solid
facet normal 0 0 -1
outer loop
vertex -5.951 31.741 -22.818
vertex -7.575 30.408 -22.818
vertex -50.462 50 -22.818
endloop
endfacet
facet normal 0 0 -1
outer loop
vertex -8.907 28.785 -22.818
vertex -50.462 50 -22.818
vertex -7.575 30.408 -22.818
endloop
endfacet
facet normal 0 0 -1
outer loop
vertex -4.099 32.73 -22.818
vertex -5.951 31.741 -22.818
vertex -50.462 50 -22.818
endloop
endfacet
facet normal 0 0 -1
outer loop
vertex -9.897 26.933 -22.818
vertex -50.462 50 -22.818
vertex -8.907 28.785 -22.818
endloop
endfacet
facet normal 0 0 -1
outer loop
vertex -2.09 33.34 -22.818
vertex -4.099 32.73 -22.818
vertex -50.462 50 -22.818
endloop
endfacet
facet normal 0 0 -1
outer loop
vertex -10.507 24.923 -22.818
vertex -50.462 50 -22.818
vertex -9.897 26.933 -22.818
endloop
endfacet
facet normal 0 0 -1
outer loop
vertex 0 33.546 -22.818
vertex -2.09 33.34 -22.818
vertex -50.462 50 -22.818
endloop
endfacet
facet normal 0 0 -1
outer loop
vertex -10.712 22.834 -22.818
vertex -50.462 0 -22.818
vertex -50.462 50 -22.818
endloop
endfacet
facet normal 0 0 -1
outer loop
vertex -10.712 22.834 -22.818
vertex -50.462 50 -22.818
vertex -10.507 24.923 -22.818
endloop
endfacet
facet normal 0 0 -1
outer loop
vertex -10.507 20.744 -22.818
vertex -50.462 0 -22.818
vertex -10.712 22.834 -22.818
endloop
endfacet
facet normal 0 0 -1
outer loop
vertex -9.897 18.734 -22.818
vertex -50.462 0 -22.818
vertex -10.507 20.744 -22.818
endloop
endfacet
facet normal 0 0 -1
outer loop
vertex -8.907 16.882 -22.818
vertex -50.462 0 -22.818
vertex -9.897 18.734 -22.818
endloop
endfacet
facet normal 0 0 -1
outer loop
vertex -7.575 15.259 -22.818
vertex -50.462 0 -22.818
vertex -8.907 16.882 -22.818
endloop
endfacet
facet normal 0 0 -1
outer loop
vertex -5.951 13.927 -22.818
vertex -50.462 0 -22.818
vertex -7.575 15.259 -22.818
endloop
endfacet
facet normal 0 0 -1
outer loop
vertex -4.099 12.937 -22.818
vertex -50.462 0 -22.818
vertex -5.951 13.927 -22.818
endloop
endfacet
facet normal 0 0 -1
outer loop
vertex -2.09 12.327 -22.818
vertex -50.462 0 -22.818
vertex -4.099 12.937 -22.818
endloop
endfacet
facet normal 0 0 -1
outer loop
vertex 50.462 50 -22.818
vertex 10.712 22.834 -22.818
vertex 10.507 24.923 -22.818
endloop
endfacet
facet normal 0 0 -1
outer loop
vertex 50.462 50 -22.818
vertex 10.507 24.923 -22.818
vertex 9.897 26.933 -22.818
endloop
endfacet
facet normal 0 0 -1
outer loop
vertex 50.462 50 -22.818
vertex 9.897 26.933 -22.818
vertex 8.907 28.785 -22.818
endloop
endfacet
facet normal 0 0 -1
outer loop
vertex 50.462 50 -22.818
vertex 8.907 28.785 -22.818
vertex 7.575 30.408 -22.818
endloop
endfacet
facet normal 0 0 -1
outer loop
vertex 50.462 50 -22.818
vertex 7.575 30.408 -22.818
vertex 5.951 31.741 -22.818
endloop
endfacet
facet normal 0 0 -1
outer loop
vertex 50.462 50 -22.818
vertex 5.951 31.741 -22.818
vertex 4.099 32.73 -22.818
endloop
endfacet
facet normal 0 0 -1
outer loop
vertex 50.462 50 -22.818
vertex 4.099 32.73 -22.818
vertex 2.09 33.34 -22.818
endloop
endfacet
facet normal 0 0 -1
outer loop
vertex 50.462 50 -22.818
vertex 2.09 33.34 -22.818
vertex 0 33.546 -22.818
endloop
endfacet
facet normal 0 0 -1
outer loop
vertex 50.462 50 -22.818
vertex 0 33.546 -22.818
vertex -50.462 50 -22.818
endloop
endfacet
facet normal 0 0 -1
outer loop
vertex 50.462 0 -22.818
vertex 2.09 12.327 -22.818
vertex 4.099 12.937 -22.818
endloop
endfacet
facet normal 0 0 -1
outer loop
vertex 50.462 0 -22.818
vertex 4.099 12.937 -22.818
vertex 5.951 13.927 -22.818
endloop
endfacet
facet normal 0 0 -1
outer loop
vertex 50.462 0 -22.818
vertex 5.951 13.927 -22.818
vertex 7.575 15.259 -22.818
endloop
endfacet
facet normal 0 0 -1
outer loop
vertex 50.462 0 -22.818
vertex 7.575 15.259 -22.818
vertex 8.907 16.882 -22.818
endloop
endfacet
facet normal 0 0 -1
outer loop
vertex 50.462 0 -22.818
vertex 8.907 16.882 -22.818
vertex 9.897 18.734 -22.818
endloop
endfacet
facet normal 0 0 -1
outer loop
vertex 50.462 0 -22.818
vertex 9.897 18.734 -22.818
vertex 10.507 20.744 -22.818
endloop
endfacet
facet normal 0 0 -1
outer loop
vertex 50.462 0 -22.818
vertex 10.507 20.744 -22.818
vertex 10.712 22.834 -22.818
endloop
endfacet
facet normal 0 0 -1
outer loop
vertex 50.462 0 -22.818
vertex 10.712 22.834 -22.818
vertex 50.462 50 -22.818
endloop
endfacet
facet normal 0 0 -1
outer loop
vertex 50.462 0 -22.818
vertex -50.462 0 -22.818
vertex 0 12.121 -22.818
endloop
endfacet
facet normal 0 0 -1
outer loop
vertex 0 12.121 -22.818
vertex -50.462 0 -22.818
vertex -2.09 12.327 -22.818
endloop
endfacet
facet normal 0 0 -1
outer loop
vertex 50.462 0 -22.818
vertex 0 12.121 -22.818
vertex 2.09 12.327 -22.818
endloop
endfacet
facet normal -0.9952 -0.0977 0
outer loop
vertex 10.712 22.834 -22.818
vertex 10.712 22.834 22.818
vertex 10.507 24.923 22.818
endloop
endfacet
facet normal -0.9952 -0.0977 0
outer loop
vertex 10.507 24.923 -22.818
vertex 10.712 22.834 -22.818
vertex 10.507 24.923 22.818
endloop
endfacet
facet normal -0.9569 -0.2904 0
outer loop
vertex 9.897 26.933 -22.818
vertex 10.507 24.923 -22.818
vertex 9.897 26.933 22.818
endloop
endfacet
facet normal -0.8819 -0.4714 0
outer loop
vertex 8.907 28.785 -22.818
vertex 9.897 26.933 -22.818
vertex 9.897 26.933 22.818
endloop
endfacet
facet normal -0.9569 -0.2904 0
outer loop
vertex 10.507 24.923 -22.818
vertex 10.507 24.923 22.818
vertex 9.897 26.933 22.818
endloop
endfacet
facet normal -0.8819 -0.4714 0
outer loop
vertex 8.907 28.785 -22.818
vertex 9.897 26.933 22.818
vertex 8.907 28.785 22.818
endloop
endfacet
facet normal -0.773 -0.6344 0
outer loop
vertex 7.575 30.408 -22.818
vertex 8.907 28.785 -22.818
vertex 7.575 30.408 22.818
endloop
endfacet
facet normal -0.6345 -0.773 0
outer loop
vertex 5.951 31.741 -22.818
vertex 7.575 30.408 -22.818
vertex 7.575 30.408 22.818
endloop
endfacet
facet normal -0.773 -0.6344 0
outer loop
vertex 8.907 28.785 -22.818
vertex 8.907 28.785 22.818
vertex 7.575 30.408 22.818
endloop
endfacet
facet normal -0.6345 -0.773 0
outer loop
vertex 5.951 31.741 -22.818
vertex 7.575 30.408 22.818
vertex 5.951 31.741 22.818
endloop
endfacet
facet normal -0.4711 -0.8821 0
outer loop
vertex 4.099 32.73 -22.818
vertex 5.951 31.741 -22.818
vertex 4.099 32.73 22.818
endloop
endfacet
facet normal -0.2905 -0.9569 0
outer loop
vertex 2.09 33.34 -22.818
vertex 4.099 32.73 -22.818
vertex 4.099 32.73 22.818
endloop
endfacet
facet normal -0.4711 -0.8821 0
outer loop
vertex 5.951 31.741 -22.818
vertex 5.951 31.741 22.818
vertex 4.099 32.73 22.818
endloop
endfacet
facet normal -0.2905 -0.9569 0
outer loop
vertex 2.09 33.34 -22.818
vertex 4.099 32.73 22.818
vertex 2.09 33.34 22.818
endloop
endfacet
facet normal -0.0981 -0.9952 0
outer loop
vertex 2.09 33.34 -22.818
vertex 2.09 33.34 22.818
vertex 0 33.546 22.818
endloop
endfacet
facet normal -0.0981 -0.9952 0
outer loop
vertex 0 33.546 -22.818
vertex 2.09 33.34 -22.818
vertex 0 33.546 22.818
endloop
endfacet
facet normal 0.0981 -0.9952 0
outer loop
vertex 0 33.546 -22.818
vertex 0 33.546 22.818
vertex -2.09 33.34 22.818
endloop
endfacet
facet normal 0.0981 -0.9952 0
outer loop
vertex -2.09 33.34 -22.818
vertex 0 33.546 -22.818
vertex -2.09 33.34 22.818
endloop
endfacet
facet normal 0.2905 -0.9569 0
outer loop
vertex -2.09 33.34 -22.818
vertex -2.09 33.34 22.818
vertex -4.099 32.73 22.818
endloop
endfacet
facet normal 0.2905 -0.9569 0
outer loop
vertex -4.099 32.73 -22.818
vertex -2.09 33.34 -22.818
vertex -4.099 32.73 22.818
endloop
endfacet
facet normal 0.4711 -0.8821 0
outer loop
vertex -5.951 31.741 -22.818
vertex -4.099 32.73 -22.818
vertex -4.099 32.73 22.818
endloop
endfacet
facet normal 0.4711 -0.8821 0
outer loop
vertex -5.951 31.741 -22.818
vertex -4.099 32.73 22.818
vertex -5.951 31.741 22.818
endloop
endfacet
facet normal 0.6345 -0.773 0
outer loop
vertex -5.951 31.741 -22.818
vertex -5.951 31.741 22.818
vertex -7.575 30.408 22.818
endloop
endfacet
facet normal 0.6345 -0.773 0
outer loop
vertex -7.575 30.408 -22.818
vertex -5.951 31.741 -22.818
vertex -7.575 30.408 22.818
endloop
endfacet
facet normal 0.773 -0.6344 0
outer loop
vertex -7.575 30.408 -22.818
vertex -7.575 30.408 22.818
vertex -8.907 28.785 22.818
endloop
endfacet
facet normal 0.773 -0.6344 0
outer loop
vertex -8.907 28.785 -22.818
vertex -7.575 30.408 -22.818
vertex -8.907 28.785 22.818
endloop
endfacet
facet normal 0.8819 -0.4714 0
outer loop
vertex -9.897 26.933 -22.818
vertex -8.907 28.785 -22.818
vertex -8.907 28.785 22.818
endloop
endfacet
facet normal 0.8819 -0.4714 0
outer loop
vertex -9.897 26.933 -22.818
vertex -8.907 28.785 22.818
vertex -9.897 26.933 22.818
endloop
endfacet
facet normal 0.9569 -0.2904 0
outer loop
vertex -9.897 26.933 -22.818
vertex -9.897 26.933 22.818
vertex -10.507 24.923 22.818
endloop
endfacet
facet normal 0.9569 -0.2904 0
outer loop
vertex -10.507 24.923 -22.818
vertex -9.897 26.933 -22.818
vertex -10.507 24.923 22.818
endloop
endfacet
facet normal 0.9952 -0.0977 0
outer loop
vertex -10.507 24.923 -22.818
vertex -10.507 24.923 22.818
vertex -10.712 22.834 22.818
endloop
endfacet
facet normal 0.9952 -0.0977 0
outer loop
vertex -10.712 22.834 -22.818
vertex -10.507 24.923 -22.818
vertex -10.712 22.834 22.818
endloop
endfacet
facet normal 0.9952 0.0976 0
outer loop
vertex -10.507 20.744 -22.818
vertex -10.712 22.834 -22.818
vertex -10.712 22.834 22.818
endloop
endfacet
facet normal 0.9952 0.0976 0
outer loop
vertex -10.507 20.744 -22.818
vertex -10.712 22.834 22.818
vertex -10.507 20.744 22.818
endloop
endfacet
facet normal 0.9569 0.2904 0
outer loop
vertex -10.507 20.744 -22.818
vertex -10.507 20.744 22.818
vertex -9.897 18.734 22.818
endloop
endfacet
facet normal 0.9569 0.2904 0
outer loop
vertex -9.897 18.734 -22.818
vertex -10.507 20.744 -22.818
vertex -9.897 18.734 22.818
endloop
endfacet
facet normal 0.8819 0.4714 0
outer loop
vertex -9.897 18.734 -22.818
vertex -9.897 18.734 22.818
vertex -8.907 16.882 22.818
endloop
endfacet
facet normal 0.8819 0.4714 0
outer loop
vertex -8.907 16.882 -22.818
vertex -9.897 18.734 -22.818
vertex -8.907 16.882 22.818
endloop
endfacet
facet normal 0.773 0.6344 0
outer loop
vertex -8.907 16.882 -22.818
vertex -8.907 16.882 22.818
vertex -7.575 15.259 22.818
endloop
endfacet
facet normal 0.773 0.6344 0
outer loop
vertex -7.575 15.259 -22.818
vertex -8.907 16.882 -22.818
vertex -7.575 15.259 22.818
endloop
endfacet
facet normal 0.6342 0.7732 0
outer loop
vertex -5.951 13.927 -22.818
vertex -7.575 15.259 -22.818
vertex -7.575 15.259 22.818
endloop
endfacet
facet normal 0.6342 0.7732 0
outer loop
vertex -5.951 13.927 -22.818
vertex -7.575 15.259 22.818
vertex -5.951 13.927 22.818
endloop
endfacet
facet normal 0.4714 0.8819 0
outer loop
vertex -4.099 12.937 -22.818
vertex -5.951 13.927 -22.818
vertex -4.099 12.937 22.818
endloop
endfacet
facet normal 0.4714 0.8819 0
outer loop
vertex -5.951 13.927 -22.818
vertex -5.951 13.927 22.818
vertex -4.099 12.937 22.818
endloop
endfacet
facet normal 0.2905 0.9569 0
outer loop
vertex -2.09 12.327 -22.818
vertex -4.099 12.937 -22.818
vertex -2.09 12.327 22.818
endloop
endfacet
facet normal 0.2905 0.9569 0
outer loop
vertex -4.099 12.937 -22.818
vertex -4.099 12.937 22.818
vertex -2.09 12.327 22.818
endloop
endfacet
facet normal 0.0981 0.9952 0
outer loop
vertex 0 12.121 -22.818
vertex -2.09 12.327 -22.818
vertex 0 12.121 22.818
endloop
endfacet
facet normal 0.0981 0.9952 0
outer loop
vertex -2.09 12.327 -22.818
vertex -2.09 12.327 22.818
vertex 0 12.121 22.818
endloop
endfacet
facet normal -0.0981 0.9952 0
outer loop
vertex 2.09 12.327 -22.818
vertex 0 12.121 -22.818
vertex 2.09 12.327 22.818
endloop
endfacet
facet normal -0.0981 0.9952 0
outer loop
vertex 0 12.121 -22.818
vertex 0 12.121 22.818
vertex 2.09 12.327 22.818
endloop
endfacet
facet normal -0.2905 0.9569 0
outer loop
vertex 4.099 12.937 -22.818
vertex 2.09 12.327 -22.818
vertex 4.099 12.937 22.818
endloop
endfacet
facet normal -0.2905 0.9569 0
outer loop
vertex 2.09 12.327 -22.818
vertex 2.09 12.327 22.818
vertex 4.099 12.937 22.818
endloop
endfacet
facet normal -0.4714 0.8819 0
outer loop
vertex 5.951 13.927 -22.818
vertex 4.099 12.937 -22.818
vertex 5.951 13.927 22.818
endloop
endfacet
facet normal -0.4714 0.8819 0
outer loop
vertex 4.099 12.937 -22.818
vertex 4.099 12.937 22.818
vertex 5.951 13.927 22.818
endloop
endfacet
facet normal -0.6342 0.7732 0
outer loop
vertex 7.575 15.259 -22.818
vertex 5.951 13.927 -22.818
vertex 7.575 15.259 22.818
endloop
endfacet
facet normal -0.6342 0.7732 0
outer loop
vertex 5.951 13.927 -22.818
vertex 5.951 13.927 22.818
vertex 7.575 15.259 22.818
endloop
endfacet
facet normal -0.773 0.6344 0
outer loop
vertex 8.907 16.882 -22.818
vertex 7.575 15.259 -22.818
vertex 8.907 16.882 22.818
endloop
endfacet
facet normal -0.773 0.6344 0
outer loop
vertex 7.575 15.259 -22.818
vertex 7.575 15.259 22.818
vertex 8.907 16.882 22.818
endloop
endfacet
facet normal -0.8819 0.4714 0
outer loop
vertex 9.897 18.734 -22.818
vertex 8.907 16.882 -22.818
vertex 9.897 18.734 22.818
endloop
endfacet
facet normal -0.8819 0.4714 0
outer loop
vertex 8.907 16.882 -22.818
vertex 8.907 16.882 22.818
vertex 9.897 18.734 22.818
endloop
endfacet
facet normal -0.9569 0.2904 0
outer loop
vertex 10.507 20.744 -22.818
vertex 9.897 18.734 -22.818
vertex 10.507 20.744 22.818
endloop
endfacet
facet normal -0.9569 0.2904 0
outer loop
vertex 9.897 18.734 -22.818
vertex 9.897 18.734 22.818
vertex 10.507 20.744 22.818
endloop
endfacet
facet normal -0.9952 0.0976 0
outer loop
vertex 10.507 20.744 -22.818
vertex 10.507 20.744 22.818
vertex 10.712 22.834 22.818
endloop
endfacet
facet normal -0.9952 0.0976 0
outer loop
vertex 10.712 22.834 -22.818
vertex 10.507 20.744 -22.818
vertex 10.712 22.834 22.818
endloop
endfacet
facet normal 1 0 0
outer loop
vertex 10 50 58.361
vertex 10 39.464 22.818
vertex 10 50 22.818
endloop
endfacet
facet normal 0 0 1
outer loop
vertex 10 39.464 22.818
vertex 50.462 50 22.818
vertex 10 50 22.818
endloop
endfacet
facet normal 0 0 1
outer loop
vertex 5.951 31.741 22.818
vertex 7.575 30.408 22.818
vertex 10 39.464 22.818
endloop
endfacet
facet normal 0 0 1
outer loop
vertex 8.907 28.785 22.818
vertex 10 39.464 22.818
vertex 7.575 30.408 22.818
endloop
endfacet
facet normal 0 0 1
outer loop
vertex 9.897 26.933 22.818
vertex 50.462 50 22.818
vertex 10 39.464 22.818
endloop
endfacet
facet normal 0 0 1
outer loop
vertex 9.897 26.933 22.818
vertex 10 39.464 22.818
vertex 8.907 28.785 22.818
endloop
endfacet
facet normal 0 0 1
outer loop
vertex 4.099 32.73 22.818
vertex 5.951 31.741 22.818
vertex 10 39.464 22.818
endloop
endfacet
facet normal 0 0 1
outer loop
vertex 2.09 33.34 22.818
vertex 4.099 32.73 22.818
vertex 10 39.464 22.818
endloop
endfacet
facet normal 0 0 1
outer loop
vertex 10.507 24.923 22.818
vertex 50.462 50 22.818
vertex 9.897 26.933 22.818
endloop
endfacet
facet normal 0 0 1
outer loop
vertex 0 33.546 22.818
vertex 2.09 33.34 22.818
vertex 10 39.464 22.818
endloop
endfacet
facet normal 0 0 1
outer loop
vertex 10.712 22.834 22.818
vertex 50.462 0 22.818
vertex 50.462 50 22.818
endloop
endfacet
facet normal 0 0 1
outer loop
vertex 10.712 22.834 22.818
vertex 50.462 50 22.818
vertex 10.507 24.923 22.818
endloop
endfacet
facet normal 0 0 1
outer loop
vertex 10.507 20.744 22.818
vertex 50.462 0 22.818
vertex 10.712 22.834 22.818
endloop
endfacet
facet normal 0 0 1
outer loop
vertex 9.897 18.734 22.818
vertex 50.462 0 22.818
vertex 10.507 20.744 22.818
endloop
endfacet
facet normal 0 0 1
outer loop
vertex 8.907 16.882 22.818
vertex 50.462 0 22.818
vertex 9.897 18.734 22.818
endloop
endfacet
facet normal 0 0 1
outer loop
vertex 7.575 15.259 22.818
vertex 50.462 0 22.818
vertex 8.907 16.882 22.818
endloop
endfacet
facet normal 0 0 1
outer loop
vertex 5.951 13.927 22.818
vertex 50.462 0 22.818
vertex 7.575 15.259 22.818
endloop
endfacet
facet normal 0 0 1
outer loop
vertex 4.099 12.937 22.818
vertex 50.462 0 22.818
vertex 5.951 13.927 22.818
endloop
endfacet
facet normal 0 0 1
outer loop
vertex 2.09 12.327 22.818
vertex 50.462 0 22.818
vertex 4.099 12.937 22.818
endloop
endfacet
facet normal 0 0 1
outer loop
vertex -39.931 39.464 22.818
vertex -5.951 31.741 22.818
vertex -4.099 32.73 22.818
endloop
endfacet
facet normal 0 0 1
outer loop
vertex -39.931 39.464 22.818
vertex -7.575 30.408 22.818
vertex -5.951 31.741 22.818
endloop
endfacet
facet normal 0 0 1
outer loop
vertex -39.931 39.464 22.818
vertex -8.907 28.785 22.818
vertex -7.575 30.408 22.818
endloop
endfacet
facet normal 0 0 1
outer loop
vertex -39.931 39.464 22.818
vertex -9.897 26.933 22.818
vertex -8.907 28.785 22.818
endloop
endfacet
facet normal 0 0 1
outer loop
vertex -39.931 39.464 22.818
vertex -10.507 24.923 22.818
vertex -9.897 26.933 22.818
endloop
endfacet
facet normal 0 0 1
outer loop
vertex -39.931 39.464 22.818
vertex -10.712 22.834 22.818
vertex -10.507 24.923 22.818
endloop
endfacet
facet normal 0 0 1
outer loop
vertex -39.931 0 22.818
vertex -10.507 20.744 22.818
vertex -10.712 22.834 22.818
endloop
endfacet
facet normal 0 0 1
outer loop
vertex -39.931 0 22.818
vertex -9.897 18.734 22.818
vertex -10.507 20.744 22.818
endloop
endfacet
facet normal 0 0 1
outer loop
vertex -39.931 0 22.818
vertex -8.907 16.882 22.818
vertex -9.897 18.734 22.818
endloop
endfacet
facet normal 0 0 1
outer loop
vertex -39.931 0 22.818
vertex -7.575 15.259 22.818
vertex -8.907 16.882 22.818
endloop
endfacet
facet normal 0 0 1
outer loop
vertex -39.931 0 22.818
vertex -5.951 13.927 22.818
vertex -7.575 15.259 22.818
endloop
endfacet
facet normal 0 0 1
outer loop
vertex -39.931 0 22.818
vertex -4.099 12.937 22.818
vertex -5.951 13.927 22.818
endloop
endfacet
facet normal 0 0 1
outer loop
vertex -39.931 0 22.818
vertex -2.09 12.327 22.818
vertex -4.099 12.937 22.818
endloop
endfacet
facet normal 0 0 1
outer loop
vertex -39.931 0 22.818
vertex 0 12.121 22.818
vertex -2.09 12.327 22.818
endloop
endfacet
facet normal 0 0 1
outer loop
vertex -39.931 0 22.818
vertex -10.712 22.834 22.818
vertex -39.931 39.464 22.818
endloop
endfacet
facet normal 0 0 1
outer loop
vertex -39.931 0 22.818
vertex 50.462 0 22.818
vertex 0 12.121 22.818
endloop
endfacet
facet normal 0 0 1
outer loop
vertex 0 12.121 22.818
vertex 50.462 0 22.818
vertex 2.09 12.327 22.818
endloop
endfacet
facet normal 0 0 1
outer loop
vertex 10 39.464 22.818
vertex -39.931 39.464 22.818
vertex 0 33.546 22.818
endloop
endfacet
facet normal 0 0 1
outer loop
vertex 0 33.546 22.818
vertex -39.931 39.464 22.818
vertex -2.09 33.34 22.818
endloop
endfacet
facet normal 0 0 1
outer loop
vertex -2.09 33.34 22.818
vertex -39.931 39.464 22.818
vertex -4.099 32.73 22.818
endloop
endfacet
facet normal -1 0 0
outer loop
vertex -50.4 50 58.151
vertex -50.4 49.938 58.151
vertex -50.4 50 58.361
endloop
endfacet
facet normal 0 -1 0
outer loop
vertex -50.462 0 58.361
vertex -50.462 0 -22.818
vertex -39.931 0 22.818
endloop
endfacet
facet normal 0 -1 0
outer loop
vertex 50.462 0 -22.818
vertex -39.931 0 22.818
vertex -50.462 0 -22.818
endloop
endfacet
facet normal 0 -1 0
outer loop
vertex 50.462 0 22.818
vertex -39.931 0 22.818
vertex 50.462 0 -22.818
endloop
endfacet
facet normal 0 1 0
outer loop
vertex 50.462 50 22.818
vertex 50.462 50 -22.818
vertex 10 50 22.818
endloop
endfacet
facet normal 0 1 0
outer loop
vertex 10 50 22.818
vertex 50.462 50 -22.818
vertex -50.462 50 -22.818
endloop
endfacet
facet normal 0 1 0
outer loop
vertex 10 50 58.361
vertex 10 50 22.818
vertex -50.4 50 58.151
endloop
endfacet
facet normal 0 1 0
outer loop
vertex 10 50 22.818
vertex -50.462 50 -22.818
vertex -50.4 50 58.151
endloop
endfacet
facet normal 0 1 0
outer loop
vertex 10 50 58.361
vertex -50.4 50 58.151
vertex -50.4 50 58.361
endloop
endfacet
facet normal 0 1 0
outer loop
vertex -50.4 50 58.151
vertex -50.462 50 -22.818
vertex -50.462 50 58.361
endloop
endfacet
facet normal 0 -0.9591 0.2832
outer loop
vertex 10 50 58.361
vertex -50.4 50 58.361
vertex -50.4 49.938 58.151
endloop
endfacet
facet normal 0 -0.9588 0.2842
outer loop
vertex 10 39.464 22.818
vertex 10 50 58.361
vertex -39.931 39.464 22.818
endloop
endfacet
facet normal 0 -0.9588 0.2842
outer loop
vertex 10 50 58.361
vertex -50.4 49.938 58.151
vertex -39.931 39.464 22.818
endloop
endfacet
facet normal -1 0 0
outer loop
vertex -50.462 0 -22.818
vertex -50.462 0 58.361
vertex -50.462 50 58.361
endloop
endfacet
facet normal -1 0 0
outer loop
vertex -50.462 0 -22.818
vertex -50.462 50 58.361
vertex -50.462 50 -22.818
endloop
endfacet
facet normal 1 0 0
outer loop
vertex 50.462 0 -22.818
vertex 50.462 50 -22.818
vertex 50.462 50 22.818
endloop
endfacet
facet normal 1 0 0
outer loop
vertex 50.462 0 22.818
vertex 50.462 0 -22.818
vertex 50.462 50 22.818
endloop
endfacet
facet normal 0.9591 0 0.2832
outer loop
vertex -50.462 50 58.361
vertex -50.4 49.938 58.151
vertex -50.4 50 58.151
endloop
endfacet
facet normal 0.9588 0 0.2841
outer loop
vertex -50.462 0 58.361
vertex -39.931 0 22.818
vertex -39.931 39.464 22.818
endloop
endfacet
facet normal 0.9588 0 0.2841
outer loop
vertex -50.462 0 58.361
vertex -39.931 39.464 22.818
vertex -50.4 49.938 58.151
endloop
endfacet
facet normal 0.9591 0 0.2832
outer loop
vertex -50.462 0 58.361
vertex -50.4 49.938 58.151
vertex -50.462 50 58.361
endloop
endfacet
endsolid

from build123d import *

# Parameters (mm, degrees)
F1_DEPTH = 50
F3_DEPTH = 50.4
F4_R     = 10.712345
F5_DEPTH = 50
F6_DEPTH = 10


with BuildPart() as f1:
    # F0 (on Front) → F1 (new body)
    with BuildSketch(Plane.XZ):
        Polygon((-50.462149, 58.360573), (-50.462149, 22.817668), (-39.930917, 22.817668), align=None)
        Polygon((-39.930917, 22.817668), (-50.462149, 22.817668), (-50.462149, -22.817668), (50.462149, -22.817668), (50.462149, 22.817668), align=None)
    extrude(amount=-F1_DEPTH)

    # F2 (on Right) → F3 (join)
    with BuildSketch(Plane.YZ):
        Polygon((39.464, 22.817668), (50, 22.817668), (50, 58.360573), align=None)
    extrude(amount=-F3_DEPTH)

    # F4 (on face) → F5 (cut)
    with BuildSketch(Plane.XY.offset(22.817668)):
        with Locations((0, 22.833524)):
            Circle(F4_R)
    extrude(amount=-F5_DEPTH, mode=Mode.SUBTRACT)

    # F3_face (on face) → F6 (join)
    with BuildSketch(Plane(origin=(0, 46.488, 34.665303), x_dir=(0, 1, 0), z_dir=(1, 0, 0))):
        Polygon((-7.024, -11.847635), (3.512, -11.847635), (3.512, 23.69527), align=None)
    extrude(amount=F6_DEPTH)


solid = f1.part
